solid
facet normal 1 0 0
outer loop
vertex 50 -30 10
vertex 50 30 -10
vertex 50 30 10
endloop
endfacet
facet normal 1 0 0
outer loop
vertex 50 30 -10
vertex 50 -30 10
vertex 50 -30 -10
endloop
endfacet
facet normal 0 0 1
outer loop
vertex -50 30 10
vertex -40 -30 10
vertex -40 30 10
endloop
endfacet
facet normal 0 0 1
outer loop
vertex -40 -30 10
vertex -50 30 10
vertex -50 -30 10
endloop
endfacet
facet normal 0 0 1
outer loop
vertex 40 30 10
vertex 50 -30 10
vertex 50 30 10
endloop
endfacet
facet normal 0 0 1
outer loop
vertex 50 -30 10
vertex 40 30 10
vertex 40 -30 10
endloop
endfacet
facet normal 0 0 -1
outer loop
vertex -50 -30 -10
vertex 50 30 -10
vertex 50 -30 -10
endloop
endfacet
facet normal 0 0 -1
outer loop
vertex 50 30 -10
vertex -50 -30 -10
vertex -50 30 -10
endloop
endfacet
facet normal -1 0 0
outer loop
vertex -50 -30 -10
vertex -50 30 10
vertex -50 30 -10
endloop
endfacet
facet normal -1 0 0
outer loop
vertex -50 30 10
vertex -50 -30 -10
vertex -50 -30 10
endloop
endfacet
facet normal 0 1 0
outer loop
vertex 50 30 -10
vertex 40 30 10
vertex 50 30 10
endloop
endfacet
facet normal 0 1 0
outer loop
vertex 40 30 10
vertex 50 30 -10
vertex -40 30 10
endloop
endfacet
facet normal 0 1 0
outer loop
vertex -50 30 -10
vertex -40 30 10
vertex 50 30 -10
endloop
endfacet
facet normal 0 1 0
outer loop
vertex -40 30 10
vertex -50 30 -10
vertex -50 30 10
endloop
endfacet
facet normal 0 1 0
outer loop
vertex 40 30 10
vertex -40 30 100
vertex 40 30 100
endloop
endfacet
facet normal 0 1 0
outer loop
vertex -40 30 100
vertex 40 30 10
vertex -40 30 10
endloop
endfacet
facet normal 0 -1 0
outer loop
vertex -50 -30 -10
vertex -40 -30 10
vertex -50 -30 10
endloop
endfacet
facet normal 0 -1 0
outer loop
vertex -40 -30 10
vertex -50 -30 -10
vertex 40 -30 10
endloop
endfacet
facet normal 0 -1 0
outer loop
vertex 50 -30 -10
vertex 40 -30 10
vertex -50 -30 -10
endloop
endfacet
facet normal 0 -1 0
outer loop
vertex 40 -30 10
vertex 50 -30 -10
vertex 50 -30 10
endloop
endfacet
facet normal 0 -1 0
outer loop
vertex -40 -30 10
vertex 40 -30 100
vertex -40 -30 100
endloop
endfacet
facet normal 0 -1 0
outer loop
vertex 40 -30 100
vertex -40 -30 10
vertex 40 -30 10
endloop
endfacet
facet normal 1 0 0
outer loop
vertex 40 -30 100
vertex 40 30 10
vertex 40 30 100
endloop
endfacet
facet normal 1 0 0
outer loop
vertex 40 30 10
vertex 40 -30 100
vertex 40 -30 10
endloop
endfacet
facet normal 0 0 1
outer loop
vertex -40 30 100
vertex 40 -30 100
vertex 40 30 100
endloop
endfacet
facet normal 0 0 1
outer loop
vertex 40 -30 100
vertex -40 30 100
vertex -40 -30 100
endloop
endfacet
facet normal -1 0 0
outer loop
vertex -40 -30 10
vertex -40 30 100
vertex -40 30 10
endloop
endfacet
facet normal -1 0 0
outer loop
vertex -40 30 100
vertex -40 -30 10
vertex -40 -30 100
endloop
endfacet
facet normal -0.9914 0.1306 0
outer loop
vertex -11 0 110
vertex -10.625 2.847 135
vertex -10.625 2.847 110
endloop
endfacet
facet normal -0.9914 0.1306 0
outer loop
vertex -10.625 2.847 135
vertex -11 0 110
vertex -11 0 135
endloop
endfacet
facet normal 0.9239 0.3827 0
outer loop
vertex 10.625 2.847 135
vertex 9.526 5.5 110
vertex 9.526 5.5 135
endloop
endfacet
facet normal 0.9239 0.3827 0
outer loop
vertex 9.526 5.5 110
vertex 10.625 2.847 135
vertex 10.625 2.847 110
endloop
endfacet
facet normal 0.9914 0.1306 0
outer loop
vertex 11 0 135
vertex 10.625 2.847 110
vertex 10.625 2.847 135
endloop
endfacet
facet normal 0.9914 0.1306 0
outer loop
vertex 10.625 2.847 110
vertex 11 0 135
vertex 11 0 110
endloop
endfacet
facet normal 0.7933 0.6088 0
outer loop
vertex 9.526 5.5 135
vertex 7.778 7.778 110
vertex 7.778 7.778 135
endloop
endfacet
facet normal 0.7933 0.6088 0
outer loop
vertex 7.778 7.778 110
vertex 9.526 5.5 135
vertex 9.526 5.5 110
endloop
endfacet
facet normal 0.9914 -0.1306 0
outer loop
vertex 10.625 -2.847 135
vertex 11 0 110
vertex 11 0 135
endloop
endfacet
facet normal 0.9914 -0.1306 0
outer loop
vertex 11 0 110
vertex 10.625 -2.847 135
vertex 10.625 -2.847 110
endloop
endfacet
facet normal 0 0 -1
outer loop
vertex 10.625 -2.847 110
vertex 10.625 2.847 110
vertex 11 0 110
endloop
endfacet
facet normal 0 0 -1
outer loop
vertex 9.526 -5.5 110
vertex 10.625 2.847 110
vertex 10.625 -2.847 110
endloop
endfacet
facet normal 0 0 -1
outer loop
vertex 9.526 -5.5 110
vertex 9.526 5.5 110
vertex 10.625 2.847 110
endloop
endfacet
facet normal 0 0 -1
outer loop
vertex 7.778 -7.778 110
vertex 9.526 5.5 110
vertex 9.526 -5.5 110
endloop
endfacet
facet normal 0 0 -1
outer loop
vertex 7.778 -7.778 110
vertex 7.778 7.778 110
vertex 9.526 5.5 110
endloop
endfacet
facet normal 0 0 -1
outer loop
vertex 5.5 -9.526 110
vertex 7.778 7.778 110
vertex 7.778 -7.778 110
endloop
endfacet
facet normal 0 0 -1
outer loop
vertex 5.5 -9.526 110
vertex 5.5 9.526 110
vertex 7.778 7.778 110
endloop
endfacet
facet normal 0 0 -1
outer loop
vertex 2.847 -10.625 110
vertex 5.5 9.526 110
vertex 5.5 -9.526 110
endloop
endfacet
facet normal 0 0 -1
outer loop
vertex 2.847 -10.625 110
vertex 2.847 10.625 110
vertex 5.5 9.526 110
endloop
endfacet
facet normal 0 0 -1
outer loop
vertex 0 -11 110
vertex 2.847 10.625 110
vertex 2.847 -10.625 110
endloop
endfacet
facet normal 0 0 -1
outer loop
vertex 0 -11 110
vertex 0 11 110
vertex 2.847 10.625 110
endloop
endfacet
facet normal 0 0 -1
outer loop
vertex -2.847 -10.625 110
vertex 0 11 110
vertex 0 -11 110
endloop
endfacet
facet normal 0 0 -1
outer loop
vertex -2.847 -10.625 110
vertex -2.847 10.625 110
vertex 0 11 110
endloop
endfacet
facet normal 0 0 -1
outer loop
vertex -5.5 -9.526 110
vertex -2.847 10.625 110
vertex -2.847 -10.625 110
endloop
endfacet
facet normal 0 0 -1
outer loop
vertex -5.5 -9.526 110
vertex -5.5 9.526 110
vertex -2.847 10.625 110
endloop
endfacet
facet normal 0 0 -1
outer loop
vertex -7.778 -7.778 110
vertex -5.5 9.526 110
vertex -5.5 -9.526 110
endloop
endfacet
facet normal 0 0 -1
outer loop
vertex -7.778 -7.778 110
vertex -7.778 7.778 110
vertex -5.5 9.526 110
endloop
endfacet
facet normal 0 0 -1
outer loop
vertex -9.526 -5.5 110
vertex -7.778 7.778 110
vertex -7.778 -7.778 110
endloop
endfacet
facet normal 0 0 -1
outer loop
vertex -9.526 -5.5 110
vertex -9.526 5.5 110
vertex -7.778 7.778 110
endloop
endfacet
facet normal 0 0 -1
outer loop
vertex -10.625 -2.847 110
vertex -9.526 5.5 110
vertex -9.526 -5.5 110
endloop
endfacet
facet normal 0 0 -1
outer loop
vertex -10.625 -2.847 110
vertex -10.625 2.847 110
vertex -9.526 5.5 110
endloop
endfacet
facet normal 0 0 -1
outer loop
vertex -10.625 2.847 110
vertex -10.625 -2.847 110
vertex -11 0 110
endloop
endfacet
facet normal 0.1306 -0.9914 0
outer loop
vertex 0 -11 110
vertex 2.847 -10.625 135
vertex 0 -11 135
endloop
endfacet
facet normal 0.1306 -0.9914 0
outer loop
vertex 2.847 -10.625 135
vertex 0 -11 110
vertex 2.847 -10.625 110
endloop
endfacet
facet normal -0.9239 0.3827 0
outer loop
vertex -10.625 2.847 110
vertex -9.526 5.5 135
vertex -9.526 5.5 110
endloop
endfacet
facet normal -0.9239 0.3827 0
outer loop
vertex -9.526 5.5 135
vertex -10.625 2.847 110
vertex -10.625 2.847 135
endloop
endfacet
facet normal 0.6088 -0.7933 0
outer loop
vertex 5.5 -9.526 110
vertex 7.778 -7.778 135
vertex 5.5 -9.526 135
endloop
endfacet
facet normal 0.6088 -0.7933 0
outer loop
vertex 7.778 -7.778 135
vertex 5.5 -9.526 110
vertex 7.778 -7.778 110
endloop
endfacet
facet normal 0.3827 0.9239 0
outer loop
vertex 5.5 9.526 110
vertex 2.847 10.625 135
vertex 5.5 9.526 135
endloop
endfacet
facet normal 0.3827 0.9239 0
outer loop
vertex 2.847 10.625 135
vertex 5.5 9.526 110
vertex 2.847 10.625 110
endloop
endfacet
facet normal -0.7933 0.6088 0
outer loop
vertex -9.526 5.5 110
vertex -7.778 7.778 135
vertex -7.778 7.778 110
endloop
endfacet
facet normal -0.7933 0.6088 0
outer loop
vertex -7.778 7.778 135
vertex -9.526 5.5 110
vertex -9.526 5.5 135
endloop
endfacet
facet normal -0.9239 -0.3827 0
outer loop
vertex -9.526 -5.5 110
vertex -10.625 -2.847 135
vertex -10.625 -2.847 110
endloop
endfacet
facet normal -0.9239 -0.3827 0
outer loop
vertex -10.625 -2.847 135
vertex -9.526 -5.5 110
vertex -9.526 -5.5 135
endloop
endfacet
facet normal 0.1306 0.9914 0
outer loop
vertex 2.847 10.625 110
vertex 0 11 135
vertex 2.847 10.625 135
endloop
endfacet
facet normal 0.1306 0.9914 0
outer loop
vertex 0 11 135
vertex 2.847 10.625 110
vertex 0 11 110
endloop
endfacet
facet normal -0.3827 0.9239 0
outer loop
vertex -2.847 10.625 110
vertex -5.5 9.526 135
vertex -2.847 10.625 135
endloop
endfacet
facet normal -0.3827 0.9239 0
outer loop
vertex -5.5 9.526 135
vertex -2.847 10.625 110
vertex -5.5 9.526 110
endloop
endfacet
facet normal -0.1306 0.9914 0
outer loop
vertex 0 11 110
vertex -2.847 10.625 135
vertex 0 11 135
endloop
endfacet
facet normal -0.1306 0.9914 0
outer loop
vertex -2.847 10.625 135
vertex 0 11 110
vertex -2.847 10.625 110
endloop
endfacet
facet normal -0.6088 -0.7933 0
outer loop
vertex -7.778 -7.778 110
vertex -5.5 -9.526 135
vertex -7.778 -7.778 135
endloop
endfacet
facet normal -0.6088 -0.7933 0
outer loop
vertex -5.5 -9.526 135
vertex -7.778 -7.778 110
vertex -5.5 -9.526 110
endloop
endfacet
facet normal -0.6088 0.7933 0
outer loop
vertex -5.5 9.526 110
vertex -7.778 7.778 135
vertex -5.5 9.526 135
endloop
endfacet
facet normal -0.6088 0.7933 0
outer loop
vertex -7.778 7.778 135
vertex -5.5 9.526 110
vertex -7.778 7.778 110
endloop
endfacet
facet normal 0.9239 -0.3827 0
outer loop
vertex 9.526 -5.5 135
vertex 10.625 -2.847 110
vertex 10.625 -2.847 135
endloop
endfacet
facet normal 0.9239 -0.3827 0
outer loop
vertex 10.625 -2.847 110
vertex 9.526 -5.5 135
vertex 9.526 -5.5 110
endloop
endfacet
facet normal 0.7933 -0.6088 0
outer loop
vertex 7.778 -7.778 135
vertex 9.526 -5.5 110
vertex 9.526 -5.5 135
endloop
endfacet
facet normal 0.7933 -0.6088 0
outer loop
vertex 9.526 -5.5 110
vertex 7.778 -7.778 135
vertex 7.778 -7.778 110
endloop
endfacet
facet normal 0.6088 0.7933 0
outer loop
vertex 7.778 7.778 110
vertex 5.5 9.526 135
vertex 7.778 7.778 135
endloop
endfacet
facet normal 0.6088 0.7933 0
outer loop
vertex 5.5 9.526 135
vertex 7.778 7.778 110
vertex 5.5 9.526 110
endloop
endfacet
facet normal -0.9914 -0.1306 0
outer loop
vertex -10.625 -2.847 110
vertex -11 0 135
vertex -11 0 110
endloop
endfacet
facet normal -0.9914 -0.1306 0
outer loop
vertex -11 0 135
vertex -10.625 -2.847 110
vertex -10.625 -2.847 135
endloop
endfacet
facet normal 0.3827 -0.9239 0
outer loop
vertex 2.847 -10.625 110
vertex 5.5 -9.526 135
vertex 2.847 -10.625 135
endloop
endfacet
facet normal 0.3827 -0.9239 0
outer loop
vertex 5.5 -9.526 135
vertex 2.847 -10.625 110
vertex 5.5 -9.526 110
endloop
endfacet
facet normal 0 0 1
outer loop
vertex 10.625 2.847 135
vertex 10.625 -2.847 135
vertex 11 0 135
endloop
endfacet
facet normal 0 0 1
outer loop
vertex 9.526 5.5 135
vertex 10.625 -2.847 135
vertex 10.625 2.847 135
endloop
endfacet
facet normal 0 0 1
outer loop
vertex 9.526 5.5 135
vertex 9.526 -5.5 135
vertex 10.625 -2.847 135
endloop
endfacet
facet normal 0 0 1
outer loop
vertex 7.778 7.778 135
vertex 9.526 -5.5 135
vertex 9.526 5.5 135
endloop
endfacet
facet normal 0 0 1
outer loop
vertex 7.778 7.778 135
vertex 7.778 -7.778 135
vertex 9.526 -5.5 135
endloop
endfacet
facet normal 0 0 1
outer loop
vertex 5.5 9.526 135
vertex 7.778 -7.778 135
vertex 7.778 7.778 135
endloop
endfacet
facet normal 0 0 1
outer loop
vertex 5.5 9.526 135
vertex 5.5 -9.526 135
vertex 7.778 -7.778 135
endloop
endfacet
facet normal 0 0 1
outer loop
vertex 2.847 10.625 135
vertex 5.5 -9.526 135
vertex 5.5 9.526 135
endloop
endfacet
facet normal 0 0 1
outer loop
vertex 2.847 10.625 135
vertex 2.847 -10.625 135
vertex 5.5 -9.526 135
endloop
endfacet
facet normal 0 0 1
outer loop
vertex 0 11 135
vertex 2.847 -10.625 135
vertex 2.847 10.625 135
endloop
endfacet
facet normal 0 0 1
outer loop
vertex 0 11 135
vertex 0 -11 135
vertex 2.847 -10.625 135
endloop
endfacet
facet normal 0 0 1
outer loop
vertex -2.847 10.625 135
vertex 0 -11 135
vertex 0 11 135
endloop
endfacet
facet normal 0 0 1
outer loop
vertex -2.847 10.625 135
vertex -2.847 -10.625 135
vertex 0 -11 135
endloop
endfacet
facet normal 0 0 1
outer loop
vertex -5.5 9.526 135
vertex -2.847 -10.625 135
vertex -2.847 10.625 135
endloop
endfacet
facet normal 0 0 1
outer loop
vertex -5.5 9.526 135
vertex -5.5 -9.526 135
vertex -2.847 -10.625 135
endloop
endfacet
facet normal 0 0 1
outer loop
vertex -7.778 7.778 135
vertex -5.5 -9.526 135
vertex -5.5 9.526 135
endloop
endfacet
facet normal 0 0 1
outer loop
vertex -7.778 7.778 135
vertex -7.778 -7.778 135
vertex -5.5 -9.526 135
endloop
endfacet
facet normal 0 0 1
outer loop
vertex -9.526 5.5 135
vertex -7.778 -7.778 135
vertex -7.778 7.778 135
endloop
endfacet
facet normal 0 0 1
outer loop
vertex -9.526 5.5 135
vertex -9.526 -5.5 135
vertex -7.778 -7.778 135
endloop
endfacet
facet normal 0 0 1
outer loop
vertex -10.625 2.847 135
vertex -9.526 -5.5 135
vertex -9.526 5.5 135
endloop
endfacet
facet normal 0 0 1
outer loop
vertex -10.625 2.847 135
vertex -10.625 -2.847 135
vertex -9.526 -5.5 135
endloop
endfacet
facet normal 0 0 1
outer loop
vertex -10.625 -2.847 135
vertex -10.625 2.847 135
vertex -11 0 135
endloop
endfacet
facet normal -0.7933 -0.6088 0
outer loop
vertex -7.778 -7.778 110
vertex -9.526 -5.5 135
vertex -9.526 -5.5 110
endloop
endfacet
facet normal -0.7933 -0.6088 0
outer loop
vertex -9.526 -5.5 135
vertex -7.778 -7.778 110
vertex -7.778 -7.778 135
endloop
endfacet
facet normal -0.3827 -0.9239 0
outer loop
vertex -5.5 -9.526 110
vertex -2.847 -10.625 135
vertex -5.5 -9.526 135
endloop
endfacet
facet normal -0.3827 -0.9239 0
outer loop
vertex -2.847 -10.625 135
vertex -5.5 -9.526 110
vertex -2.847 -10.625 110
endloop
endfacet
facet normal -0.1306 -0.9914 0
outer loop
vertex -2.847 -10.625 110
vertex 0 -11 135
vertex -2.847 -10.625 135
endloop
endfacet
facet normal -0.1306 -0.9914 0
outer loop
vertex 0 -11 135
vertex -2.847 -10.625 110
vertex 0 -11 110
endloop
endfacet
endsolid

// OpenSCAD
// Paddle flow switch (Potter VSR), saddle-mounted on pipe.
//
// @part flow_switch
// @kind device
// @category device.flow.switch
// @display-name "Paddle Flow Switch (Potter VSR)"
// @mfg potter
// @mfg-pn VSR-2
// @listing UL FM
// @price-usd 88.00
// @install-minutes 20
// @crew journeyman
// @param pipe_size_in enum[2,2.5,3,4,6,8] default=4 label="Pipe Size" unit="in"
// @port saddle position=[0,0,-0.01] direction=[0,0,-1] style=none size_in=4 role=branch

saddle_l = 100;
saddle_w = 60;
saddle_h = 20;
body_w = 80;
body_d = 60;
body_h = 90;
union() {
    translate([0, 0, 0])
        cube(size = [saddle_l, saddle_w, saddle_h], center = true);
    translate([0, 0, saddle_h / 2 + body_h / 2])
        cube(size = [body_w, body_d, body_h], center = true);
    // Conduit knockout on top
    translate([0, 0, saddle_h + body_h])
        cylinder(h = 25, d = 22, $fn = 24);
}
